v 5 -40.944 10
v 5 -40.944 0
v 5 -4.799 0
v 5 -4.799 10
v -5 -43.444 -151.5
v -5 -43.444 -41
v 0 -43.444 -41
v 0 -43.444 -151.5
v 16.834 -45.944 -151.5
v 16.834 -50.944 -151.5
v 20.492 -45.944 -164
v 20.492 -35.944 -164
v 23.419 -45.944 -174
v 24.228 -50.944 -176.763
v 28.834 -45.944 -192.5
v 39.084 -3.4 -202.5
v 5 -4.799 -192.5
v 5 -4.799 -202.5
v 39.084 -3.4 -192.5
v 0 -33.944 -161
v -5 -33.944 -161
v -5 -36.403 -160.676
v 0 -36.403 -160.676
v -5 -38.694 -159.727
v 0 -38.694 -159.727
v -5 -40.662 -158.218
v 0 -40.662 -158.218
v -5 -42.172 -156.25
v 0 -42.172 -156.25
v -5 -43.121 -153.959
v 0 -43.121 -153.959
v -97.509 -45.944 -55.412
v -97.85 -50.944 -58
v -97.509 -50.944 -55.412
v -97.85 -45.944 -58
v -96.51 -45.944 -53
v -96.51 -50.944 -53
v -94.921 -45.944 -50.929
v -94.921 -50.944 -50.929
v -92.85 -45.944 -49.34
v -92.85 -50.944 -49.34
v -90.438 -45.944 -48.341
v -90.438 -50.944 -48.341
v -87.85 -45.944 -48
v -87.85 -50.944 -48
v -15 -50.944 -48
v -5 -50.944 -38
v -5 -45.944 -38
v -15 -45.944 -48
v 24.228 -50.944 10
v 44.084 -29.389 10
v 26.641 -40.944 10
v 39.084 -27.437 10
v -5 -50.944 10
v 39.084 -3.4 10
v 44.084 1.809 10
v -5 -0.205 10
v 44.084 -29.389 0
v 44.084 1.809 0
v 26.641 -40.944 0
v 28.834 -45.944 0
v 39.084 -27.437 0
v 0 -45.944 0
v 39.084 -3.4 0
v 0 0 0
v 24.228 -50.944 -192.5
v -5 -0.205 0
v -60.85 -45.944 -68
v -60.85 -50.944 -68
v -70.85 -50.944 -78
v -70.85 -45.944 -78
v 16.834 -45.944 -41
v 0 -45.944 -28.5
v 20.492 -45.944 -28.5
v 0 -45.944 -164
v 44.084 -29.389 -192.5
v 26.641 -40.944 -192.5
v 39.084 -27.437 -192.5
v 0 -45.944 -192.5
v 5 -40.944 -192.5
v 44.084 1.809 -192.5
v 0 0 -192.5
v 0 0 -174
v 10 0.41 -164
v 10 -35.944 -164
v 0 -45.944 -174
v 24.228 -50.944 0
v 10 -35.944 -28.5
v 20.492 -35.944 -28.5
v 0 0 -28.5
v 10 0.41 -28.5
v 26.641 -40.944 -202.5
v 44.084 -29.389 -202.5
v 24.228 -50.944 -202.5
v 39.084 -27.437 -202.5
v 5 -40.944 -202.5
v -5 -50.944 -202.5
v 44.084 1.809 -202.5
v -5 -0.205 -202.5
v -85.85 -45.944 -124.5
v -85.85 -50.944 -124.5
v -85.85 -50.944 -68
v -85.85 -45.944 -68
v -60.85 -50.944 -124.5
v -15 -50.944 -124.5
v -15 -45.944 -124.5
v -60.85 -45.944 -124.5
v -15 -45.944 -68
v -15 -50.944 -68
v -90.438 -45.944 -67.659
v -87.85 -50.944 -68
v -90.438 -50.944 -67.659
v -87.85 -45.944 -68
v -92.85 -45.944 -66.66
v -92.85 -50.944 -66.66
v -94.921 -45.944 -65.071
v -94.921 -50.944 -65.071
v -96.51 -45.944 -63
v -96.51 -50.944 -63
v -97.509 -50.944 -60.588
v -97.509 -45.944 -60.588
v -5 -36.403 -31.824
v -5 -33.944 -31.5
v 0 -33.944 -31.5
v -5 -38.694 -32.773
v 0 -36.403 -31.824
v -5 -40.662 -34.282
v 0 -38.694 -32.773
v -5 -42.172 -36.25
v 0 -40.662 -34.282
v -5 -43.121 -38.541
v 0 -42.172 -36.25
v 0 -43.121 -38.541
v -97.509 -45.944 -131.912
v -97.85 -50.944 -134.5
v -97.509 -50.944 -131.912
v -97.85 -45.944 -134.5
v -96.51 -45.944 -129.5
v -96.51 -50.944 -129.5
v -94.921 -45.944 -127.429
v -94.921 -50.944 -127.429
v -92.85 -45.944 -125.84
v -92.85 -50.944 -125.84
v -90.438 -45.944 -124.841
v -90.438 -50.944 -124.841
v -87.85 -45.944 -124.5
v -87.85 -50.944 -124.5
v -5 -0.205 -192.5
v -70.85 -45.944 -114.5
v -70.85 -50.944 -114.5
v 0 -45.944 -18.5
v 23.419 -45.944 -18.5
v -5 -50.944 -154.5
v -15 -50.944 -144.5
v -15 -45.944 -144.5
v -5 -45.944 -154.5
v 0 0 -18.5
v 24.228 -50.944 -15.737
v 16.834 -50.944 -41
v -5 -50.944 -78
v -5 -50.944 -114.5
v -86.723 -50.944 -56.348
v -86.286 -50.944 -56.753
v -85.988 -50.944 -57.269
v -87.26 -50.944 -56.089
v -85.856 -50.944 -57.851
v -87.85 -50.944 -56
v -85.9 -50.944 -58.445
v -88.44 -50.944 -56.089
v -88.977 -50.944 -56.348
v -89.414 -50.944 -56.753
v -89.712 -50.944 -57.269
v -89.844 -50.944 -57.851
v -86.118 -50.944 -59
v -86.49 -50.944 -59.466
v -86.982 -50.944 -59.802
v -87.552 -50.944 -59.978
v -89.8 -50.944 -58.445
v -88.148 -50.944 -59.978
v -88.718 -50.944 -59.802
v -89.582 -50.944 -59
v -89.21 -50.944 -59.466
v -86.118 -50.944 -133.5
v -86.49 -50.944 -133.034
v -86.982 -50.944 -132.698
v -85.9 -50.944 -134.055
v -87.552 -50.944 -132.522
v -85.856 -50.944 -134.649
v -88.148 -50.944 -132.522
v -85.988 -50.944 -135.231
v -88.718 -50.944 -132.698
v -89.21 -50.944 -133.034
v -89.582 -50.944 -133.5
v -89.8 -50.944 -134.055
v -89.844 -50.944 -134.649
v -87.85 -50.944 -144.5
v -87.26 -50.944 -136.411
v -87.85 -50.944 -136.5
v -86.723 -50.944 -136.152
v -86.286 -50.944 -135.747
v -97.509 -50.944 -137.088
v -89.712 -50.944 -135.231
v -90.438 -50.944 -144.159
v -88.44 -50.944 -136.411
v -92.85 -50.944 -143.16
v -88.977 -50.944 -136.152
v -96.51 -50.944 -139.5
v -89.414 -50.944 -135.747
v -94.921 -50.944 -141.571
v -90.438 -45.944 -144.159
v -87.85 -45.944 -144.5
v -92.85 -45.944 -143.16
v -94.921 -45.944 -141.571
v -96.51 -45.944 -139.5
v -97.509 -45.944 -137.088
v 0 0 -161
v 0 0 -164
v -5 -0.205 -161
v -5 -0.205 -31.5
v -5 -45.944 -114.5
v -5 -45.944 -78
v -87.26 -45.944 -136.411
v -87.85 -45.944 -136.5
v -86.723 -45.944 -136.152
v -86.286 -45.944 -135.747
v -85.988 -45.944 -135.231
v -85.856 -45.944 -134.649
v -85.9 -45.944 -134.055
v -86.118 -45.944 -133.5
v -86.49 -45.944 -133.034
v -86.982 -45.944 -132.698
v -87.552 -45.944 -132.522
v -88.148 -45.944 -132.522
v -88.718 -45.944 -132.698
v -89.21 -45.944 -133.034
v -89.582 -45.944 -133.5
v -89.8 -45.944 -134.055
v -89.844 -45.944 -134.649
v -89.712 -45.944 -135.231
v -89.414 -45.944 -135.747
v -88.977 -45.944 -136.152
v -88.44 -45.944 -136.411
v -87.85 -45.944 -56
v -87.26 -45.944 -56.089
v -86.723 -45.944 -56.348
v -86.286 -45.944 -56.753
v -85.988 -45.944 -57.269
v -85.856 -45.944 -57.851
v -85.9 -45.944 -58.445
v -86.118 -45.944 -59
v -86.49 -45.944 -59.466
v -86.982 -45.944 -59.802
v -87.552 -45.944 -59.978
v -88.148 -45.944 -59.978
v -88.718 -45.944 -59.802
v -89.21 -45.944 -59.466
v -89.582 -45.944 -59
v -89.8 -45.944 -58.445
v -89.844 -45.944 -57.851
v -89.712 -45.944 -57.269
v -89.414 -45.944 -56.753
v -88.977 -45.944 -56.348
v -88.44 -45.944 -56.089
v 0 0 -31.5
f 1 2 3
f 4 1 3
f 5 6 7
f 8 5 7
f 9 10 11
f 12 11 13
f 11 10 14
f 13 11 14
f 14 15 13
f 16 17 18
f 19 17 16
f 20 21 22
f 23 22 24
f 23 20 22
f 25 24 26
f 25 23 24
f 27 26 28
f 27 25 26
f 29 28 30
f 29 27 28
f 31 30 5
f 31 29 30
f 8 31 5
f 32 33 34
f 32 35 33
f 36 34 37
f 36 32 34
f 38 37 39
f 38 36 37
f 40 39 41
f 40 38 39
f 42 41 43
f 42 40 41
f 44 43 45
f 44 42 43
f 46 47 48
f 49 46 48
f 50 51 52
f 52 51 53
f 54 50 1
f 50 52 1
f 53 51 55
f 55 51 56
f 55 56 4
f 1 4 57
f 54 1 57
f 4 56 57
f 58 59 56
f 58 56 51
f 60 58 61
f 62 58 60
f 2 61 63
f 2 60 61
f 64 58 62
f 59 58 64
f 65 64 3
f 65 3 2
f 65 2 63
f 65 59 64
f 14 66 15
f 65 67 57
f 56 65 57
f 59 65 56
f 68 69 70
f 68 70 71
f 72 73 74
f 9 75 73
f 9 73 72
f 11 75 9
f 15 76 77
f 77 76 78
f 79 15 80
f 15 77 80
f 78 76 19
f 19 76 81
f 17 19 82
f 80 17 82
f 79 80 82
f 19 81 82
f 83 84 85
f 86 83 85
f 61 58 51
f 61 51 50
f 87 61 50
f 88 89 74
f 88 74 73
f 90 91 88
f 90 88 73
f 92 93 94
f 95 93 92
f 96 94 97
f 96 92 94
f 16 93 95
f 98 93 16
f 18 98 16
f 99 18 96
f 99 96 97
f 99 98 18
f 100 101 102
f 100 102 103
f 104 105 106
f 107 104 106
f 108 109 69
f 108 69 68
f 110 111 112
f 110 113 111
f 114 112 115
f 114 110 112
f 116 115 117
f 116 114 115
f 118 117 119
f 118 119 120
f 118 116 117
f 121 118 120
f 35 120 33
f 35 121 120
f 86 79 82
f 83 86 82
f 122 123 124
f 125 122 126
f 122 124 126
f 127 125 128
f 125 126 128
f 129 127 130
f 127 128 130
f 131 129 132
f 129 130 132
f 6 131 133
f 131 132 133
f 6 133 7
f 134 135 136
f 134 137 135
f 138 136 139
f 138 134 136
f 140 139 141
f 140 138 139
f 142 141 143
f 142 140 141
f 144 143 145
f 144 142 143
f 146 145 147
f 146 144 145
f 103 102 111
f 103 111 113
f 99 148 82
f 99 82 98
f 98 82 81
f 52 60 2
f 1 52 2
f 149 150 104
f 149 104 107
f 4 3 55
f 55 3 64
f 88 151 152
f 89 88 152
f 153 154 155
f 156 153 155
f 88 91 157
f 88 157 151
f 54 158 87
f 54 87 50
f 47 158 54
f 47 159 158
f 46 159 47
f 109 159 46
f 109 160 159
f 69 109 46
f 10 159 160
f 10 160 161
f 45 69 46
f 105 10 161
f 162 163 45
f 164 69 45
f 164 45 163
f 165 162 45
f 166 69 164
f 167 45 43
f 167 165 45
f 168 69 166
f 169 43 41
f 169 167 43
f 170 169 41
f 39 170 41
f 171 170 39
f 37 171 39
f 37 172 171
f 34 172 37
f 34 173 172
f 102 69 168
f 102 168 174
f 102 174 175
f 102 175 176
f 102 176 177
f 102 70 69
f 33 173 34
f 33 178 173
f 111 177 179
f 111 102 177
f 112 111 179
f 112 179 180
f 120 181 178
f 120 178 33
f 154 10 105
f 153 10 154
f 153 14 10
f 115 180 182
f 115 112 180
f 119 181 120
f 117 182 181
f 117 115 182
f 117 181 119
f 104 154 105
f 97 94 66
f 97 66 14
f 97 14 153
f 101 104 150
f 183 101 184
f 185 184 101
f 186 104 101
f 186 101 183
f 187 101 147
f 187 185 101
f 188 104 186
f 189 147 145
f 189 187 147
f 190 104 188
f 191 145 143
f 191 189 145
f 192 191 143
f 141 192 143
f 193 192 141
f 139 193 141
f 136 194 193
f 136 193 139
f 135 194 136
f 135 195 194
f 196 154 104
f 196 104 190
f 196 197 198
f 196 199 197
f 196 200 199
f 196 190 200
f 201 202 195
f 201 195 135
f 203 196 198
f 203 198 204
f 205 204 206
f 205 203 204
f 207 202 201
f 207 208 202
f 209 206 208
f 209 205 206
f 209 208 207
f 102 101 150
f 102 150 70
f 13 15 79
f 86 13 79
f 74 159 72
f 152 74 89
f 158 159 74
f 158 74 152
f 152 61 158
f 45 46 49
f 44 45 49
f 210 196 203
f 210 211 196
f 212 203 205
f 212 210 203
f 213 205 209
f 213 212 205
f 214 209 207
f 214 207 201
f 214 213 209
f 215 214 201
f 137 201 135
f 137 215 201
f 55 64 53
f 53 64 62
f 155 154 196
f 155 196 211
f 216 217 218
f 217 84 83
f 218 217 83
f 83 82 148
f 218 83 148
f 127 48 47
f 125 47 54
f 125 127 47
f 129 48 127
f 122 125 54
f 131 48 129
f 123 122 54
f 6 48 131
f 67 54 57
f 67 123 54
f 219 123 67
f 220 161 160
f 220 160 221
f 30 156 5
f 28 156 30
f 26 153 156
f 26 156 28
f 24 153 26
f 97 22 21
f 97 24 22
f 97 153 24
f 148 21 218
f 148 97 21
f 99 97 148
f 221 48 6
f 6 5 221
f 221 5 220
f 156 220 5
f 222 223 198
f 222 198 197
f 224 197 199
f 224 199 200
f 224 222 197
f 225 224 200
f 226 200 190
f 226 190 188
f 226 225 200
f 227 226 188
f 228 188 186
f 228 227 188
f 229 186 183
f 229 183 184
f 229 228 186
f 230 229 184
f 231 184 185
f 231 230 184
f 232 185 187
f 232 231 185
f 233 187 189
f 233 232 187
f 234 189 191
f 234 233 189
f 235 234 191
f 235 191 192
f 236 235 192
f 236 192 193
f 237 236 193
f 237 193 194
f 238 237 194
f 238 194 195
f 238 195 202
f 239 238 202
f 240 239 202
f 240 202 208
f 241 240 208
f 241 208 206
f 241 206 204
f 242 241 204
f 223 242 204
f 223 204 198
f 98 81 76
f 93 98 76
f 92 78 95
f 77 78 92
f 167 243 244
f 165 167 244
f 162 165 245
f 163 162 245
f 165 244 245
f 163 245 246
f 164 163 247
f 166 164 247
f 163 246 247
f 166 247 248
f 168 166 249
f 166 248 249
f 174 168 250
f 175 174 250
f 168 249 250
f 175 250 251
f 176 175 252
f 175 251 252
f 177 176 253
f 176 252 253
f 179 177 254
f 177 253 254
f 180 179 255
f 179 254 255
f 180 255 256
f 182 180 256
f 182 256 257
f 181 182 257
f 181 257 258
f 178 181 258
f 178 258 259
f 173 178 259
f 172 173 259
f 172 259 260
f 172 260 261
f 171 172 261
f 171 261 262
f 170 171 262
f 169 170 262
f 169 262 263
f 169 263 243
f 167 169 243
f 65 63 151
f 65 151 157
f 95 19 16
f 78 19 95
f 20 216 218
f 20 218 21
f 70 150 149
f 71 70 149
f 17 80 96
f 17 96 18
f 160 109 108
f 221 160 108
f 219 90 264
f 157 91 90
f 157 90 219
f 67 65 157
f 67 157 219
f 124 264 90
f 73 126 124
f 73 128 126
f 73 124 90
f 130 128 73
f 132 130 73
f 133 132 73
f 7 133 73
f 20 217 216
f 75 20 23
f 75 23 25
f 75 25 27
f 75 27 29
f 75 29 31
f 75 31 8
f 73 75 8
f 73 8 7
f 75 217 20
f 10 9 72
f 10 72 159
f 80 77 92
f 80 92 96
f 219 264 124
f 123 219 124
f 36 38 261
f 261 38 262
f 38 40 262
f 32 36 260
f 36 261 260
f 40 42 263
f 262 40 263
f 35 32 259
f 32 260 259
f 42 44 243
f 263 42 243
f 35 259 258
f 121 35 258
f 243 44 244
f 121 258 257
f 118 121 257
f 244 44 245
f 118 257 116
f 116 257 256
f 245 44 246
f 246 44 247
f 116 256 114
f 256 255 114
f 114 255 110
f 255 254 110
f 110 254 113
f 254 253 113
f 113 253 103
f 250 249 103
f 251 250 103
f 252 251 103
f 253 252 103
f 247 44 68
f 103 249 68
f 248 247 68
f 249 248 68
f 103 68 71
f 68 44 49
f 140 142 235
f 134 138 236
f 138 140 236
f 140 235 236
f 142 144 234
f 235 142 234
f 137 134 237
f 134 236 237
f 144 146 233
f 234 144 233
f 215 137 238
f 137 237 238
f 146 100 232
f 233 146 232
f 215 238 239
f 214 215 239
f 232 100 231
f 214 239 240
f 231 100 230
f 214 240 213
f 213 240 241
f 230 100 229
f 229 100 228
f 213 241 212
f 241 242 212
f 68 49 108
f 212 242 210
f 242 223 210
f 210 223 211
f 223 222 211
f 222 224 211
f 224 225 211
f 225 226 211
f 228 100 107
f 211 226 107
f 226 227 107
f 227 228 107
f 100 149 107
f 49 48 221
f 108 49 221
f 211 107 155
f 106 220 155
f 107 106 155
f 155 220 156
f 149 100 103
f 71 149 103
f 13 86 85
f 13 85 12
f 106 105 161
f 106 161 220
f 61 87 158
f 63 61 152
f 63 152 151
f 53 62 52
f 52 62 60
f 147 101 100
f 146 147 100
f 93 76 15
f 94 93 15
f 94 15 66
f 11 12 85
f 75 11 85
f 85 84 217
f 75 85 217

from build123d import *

# Parameters (mm, degrees)
BOSS_EXTRUDE1_DEPTH     = 10
BOSS_EXTRUDE6_DEPTH     = 41
CUT_EXTRUDE1_REACH      = 80.865
CUT_EXTRUDE2_REACH      = 80.865
BOSS_EXTRUDE9_DEPTH     = 10
CHAMFER3_SIZE           = 10
CUT_EXTRUDE3_DEPTH      = 77.842469388
CUT_EXTRUDE3_DEPTH_BACK = 77.842469388
BOSS_EXTRUDE10_DEPTH    = 55.25
SKETCH13_W              = 20
SKETCH13_H              = 5
BOSS_EXTRUDE11_DEPTH    = 92.85
CUT_EXTRUDE4_REACH      = 147.324
SKETCH14_R              = 2
SKETCH15_W              = 15
SKETCH15_H              = 5
BOSS_EXTRUDE12_DEPTH    = 28.25
FILLET1_R               = 10
CHAMFER4_SIZE           = 10


with BuildPart() as part:
    # Sketch2 → Boss-Extrude1 (new body)
    with BuildSketch(Plane.XY):
        Polygon((-5, -50.944473192), (-5, -0.20517252), (44.083730464, 1.808954014), (44.083730464, -29.38936641), (24.227900916, -50.944473192), align=None)
    extrude(amount=BOSS_EXTRUDE1_DEPTH)

    # Sketch2<5> → Boss-Extrude6 (add)
    with BuildSketch(Plane.XY):
        Polygon((-5, -0.20517252), (-5, -50.944473192), (24.227900916, -50.944473192), (28.833730464, -45.944473192), (0, -45.944473192), (0, 0), align=None)
    extrude(amount=-BOSS_EXTRUDE6_DEPTH)

    # Sketch6 → Cut-Extrude1 (cut, up to next)
    with BuildSketch(Plane(origin=(0, 0, 0), x_dir=(0, 0, -1), z_dir=(1, 0, 0)), mode=Mode.PRIVATE) as cut_extrude1_sk1:
        with BuildLine():
            Line((31.5, 0), (31.5, -33.944473192))
            ThreePointArc((31.5, -33.944473192), (47.717514421, -40.661987613), (41, -24.444473192))
            Line((41, -24.444473192), (41, 0))
            Line((41, 0), (31.5, 0))
        make_face()
    cut_extrude1_tool1 = extrude(cut_extrude1_sk1.sketch, amount=-CUT_EXTRUDE1_REACH, mode=Mode.PRIVATE) & part.part
    add(cut_extrude1_tool1.solids().sort_by_distance((0, -24.250765, -38.671635))[0], mode=Mode.SUBTRACT)

    # Sketch7 → Cut-Extrude2 (cut, up to next)
    with BuildSketch(Plane(origin=(0, 0, 0), x_dir=(-1, 0, 0), z_dir=(0, 0, -1)), mode=Mode.PRIVATE) as cut_extrude2_sk1:
        Polygon((-5, -4.799035286), (-39.083730464, -3.400426311), (-39.083730464, -27.437423368), (-26.641496625, -40.944473192), (-5, -40.944473192), align=None)
    cut_extrude2_tool1 = extrude(cut_extrude2_sk1.sketch, amount=-CUT_EXTRUDE2_REACH, mode=Mode.PRIVATE) & part.part
    add(cut_extrude2_tool1.solids().sort_by_distance((21.232744, -21.521517, 0))[0], mode=Mode.SUBTRACT)

    # Sketch10 → Boss-Extrude9 (add)
    with BuildSketch(Plane.XY.offset(-28.5)):
        Polygon((28.833730464, -45.944473192), (0, -45.944473192), (0, 0), (10, 0.41034504), (10, -35.944473192), (28.833730464, -35.944473192), align=None)
    extrude(amount=BOSS_EXTRUDE9_DEPTH)

    # Chamfer3
    chamfer3_edges = [part.edges().sort_by_distance(p)[0] for p in [
        (19.416865232, -35.944473192, -18.5),
        (10, -17.767064076, -18.5),
    ]]
    chamfer(chamfer3_edges, length=CHAMFER3_SIZE - 0.0001)  # a hair under: the kernel refuses the full size

    # Sketch11 → Cut-Extrude3 (cut, two sides: drawn at the far end of the back side and taken through both)
    with BuildSketch(Plane(origin=(0, -45.944473192, 0), x_dir=(1, 0, 0), z_dir=(0, 1, 0)).offset(-CUT_EXTRUDE3_DEPTH_BACK)):
        Polygon((28.833730464, 41), (16.833730464, 41), (28.833730464, 0), align=None)
    extrude(amount=CUT_EXTRUDE3_DEPTH + CUT_EXTRUDE3_DEPTH_BACK, mode=Mode.SUBTRACT)

    # Sketch12 → Boss-Extrude10 (add)
    with BuildSketch(Plane(origin=(0, 0, -41), x_dir=(-1, 0, 0), z_dir=(0, 0, -1))):
        Polygon((0, -45.944473192), (-16.833730464, -45.944473192), (-16.833730464, -50.944473192), (5, -50.944473192), (5, -43.444473192), (0, -43.444473192), align=None)
    extrude(amount=BOSS_EXTRUDE10_DEPTH)

    # Sketch13 → Boss-Extrude11 (add)
    with BuildSketch(Plane.ZY.offset(5)):
        with Locations((-58, -48.444473192)):
            Rectangle(SKETCH13_W, SKETCH13_H)
    extrude(amount=BOSS_EXTRUDE11_DEPTH)

    # Sketch14 → Cut-Extrude4 (cut, up to next)
    with BuildSketch(Plane(origin=(0, -45.944473192, 0), x_dir=(1, 0, 0), z_dir=(0, 1, 0)), mode=Mode.PRIVATE) as cut_extrude4_sk1:
        with Locations(Location((-87.85, 58, 0), (0, 0, 270))):
            Circle(SKETCH14_R)
    cut_extrude4_tool1 = extrude(cut_extrude4_sk1.sketch, amount=-CUT_EXTRUDE4_REACH, mode=Mode.PRIVATE) & part.part
    add(cut_extrude4_tool1.solids().sort_by_distance((-87.85, -45.944473, -58))[0], mode=Mode.SUBTRACT)

    # Sketch15 → Boss-Extrude12 (add)
    with BuildSketch(Plane(origin=(0, 0, -68), x_dir=(-1, 0, 0), z_dir=(0, 0, -1))):
        with Locations((78.35, -48.444473192)):
            Rectangle(SKETCH15_W, SKETCH15_H)
    extrude(amount=BOSS_EXTRUDE12_DEPTH)

    # Mirror1: part across plane


with BuildPart() as part_1:
    add(part.part)
    add(part.part.mirror(Plane(origin=(0, 0, -96.25), x_dir=(1, 0, 0), z_dir=(0, 0, -1))))

    # Fillet1
    fillet1_edges = [part_1.edges().sort_by_distance(p)[0] for p in [
        (-97.85, -48.444473192, -144.5),
        (-97.85, -48.444473192, -48),
        (-97.85, -48.444473192, -124.5),
        (-97.85, -48.444473192, -68),
    ]]
    fillet(fillet1_edges, radius=FILLET1_R - 0.0001)  # a hair under: the kernel refuses the full size

    # Chamfer4
    chamfer4_edges = [part_1.edges().sort_by_distance(p)[0] for p in [
        (-5, -48.444473192, -68),
        (-5, -48.444473192, -48),
        (-70.85, -48.444473192, -68),
        (-70.85, -48.444473192, -124.5),
        (-5, -48.444473192, -124.5),
        (-5, -48.444473192, -144.5),
    ]]
    chamfer(chamfer4_edges, length=CHAMFER4_SIZE)


solid = part_1.part
